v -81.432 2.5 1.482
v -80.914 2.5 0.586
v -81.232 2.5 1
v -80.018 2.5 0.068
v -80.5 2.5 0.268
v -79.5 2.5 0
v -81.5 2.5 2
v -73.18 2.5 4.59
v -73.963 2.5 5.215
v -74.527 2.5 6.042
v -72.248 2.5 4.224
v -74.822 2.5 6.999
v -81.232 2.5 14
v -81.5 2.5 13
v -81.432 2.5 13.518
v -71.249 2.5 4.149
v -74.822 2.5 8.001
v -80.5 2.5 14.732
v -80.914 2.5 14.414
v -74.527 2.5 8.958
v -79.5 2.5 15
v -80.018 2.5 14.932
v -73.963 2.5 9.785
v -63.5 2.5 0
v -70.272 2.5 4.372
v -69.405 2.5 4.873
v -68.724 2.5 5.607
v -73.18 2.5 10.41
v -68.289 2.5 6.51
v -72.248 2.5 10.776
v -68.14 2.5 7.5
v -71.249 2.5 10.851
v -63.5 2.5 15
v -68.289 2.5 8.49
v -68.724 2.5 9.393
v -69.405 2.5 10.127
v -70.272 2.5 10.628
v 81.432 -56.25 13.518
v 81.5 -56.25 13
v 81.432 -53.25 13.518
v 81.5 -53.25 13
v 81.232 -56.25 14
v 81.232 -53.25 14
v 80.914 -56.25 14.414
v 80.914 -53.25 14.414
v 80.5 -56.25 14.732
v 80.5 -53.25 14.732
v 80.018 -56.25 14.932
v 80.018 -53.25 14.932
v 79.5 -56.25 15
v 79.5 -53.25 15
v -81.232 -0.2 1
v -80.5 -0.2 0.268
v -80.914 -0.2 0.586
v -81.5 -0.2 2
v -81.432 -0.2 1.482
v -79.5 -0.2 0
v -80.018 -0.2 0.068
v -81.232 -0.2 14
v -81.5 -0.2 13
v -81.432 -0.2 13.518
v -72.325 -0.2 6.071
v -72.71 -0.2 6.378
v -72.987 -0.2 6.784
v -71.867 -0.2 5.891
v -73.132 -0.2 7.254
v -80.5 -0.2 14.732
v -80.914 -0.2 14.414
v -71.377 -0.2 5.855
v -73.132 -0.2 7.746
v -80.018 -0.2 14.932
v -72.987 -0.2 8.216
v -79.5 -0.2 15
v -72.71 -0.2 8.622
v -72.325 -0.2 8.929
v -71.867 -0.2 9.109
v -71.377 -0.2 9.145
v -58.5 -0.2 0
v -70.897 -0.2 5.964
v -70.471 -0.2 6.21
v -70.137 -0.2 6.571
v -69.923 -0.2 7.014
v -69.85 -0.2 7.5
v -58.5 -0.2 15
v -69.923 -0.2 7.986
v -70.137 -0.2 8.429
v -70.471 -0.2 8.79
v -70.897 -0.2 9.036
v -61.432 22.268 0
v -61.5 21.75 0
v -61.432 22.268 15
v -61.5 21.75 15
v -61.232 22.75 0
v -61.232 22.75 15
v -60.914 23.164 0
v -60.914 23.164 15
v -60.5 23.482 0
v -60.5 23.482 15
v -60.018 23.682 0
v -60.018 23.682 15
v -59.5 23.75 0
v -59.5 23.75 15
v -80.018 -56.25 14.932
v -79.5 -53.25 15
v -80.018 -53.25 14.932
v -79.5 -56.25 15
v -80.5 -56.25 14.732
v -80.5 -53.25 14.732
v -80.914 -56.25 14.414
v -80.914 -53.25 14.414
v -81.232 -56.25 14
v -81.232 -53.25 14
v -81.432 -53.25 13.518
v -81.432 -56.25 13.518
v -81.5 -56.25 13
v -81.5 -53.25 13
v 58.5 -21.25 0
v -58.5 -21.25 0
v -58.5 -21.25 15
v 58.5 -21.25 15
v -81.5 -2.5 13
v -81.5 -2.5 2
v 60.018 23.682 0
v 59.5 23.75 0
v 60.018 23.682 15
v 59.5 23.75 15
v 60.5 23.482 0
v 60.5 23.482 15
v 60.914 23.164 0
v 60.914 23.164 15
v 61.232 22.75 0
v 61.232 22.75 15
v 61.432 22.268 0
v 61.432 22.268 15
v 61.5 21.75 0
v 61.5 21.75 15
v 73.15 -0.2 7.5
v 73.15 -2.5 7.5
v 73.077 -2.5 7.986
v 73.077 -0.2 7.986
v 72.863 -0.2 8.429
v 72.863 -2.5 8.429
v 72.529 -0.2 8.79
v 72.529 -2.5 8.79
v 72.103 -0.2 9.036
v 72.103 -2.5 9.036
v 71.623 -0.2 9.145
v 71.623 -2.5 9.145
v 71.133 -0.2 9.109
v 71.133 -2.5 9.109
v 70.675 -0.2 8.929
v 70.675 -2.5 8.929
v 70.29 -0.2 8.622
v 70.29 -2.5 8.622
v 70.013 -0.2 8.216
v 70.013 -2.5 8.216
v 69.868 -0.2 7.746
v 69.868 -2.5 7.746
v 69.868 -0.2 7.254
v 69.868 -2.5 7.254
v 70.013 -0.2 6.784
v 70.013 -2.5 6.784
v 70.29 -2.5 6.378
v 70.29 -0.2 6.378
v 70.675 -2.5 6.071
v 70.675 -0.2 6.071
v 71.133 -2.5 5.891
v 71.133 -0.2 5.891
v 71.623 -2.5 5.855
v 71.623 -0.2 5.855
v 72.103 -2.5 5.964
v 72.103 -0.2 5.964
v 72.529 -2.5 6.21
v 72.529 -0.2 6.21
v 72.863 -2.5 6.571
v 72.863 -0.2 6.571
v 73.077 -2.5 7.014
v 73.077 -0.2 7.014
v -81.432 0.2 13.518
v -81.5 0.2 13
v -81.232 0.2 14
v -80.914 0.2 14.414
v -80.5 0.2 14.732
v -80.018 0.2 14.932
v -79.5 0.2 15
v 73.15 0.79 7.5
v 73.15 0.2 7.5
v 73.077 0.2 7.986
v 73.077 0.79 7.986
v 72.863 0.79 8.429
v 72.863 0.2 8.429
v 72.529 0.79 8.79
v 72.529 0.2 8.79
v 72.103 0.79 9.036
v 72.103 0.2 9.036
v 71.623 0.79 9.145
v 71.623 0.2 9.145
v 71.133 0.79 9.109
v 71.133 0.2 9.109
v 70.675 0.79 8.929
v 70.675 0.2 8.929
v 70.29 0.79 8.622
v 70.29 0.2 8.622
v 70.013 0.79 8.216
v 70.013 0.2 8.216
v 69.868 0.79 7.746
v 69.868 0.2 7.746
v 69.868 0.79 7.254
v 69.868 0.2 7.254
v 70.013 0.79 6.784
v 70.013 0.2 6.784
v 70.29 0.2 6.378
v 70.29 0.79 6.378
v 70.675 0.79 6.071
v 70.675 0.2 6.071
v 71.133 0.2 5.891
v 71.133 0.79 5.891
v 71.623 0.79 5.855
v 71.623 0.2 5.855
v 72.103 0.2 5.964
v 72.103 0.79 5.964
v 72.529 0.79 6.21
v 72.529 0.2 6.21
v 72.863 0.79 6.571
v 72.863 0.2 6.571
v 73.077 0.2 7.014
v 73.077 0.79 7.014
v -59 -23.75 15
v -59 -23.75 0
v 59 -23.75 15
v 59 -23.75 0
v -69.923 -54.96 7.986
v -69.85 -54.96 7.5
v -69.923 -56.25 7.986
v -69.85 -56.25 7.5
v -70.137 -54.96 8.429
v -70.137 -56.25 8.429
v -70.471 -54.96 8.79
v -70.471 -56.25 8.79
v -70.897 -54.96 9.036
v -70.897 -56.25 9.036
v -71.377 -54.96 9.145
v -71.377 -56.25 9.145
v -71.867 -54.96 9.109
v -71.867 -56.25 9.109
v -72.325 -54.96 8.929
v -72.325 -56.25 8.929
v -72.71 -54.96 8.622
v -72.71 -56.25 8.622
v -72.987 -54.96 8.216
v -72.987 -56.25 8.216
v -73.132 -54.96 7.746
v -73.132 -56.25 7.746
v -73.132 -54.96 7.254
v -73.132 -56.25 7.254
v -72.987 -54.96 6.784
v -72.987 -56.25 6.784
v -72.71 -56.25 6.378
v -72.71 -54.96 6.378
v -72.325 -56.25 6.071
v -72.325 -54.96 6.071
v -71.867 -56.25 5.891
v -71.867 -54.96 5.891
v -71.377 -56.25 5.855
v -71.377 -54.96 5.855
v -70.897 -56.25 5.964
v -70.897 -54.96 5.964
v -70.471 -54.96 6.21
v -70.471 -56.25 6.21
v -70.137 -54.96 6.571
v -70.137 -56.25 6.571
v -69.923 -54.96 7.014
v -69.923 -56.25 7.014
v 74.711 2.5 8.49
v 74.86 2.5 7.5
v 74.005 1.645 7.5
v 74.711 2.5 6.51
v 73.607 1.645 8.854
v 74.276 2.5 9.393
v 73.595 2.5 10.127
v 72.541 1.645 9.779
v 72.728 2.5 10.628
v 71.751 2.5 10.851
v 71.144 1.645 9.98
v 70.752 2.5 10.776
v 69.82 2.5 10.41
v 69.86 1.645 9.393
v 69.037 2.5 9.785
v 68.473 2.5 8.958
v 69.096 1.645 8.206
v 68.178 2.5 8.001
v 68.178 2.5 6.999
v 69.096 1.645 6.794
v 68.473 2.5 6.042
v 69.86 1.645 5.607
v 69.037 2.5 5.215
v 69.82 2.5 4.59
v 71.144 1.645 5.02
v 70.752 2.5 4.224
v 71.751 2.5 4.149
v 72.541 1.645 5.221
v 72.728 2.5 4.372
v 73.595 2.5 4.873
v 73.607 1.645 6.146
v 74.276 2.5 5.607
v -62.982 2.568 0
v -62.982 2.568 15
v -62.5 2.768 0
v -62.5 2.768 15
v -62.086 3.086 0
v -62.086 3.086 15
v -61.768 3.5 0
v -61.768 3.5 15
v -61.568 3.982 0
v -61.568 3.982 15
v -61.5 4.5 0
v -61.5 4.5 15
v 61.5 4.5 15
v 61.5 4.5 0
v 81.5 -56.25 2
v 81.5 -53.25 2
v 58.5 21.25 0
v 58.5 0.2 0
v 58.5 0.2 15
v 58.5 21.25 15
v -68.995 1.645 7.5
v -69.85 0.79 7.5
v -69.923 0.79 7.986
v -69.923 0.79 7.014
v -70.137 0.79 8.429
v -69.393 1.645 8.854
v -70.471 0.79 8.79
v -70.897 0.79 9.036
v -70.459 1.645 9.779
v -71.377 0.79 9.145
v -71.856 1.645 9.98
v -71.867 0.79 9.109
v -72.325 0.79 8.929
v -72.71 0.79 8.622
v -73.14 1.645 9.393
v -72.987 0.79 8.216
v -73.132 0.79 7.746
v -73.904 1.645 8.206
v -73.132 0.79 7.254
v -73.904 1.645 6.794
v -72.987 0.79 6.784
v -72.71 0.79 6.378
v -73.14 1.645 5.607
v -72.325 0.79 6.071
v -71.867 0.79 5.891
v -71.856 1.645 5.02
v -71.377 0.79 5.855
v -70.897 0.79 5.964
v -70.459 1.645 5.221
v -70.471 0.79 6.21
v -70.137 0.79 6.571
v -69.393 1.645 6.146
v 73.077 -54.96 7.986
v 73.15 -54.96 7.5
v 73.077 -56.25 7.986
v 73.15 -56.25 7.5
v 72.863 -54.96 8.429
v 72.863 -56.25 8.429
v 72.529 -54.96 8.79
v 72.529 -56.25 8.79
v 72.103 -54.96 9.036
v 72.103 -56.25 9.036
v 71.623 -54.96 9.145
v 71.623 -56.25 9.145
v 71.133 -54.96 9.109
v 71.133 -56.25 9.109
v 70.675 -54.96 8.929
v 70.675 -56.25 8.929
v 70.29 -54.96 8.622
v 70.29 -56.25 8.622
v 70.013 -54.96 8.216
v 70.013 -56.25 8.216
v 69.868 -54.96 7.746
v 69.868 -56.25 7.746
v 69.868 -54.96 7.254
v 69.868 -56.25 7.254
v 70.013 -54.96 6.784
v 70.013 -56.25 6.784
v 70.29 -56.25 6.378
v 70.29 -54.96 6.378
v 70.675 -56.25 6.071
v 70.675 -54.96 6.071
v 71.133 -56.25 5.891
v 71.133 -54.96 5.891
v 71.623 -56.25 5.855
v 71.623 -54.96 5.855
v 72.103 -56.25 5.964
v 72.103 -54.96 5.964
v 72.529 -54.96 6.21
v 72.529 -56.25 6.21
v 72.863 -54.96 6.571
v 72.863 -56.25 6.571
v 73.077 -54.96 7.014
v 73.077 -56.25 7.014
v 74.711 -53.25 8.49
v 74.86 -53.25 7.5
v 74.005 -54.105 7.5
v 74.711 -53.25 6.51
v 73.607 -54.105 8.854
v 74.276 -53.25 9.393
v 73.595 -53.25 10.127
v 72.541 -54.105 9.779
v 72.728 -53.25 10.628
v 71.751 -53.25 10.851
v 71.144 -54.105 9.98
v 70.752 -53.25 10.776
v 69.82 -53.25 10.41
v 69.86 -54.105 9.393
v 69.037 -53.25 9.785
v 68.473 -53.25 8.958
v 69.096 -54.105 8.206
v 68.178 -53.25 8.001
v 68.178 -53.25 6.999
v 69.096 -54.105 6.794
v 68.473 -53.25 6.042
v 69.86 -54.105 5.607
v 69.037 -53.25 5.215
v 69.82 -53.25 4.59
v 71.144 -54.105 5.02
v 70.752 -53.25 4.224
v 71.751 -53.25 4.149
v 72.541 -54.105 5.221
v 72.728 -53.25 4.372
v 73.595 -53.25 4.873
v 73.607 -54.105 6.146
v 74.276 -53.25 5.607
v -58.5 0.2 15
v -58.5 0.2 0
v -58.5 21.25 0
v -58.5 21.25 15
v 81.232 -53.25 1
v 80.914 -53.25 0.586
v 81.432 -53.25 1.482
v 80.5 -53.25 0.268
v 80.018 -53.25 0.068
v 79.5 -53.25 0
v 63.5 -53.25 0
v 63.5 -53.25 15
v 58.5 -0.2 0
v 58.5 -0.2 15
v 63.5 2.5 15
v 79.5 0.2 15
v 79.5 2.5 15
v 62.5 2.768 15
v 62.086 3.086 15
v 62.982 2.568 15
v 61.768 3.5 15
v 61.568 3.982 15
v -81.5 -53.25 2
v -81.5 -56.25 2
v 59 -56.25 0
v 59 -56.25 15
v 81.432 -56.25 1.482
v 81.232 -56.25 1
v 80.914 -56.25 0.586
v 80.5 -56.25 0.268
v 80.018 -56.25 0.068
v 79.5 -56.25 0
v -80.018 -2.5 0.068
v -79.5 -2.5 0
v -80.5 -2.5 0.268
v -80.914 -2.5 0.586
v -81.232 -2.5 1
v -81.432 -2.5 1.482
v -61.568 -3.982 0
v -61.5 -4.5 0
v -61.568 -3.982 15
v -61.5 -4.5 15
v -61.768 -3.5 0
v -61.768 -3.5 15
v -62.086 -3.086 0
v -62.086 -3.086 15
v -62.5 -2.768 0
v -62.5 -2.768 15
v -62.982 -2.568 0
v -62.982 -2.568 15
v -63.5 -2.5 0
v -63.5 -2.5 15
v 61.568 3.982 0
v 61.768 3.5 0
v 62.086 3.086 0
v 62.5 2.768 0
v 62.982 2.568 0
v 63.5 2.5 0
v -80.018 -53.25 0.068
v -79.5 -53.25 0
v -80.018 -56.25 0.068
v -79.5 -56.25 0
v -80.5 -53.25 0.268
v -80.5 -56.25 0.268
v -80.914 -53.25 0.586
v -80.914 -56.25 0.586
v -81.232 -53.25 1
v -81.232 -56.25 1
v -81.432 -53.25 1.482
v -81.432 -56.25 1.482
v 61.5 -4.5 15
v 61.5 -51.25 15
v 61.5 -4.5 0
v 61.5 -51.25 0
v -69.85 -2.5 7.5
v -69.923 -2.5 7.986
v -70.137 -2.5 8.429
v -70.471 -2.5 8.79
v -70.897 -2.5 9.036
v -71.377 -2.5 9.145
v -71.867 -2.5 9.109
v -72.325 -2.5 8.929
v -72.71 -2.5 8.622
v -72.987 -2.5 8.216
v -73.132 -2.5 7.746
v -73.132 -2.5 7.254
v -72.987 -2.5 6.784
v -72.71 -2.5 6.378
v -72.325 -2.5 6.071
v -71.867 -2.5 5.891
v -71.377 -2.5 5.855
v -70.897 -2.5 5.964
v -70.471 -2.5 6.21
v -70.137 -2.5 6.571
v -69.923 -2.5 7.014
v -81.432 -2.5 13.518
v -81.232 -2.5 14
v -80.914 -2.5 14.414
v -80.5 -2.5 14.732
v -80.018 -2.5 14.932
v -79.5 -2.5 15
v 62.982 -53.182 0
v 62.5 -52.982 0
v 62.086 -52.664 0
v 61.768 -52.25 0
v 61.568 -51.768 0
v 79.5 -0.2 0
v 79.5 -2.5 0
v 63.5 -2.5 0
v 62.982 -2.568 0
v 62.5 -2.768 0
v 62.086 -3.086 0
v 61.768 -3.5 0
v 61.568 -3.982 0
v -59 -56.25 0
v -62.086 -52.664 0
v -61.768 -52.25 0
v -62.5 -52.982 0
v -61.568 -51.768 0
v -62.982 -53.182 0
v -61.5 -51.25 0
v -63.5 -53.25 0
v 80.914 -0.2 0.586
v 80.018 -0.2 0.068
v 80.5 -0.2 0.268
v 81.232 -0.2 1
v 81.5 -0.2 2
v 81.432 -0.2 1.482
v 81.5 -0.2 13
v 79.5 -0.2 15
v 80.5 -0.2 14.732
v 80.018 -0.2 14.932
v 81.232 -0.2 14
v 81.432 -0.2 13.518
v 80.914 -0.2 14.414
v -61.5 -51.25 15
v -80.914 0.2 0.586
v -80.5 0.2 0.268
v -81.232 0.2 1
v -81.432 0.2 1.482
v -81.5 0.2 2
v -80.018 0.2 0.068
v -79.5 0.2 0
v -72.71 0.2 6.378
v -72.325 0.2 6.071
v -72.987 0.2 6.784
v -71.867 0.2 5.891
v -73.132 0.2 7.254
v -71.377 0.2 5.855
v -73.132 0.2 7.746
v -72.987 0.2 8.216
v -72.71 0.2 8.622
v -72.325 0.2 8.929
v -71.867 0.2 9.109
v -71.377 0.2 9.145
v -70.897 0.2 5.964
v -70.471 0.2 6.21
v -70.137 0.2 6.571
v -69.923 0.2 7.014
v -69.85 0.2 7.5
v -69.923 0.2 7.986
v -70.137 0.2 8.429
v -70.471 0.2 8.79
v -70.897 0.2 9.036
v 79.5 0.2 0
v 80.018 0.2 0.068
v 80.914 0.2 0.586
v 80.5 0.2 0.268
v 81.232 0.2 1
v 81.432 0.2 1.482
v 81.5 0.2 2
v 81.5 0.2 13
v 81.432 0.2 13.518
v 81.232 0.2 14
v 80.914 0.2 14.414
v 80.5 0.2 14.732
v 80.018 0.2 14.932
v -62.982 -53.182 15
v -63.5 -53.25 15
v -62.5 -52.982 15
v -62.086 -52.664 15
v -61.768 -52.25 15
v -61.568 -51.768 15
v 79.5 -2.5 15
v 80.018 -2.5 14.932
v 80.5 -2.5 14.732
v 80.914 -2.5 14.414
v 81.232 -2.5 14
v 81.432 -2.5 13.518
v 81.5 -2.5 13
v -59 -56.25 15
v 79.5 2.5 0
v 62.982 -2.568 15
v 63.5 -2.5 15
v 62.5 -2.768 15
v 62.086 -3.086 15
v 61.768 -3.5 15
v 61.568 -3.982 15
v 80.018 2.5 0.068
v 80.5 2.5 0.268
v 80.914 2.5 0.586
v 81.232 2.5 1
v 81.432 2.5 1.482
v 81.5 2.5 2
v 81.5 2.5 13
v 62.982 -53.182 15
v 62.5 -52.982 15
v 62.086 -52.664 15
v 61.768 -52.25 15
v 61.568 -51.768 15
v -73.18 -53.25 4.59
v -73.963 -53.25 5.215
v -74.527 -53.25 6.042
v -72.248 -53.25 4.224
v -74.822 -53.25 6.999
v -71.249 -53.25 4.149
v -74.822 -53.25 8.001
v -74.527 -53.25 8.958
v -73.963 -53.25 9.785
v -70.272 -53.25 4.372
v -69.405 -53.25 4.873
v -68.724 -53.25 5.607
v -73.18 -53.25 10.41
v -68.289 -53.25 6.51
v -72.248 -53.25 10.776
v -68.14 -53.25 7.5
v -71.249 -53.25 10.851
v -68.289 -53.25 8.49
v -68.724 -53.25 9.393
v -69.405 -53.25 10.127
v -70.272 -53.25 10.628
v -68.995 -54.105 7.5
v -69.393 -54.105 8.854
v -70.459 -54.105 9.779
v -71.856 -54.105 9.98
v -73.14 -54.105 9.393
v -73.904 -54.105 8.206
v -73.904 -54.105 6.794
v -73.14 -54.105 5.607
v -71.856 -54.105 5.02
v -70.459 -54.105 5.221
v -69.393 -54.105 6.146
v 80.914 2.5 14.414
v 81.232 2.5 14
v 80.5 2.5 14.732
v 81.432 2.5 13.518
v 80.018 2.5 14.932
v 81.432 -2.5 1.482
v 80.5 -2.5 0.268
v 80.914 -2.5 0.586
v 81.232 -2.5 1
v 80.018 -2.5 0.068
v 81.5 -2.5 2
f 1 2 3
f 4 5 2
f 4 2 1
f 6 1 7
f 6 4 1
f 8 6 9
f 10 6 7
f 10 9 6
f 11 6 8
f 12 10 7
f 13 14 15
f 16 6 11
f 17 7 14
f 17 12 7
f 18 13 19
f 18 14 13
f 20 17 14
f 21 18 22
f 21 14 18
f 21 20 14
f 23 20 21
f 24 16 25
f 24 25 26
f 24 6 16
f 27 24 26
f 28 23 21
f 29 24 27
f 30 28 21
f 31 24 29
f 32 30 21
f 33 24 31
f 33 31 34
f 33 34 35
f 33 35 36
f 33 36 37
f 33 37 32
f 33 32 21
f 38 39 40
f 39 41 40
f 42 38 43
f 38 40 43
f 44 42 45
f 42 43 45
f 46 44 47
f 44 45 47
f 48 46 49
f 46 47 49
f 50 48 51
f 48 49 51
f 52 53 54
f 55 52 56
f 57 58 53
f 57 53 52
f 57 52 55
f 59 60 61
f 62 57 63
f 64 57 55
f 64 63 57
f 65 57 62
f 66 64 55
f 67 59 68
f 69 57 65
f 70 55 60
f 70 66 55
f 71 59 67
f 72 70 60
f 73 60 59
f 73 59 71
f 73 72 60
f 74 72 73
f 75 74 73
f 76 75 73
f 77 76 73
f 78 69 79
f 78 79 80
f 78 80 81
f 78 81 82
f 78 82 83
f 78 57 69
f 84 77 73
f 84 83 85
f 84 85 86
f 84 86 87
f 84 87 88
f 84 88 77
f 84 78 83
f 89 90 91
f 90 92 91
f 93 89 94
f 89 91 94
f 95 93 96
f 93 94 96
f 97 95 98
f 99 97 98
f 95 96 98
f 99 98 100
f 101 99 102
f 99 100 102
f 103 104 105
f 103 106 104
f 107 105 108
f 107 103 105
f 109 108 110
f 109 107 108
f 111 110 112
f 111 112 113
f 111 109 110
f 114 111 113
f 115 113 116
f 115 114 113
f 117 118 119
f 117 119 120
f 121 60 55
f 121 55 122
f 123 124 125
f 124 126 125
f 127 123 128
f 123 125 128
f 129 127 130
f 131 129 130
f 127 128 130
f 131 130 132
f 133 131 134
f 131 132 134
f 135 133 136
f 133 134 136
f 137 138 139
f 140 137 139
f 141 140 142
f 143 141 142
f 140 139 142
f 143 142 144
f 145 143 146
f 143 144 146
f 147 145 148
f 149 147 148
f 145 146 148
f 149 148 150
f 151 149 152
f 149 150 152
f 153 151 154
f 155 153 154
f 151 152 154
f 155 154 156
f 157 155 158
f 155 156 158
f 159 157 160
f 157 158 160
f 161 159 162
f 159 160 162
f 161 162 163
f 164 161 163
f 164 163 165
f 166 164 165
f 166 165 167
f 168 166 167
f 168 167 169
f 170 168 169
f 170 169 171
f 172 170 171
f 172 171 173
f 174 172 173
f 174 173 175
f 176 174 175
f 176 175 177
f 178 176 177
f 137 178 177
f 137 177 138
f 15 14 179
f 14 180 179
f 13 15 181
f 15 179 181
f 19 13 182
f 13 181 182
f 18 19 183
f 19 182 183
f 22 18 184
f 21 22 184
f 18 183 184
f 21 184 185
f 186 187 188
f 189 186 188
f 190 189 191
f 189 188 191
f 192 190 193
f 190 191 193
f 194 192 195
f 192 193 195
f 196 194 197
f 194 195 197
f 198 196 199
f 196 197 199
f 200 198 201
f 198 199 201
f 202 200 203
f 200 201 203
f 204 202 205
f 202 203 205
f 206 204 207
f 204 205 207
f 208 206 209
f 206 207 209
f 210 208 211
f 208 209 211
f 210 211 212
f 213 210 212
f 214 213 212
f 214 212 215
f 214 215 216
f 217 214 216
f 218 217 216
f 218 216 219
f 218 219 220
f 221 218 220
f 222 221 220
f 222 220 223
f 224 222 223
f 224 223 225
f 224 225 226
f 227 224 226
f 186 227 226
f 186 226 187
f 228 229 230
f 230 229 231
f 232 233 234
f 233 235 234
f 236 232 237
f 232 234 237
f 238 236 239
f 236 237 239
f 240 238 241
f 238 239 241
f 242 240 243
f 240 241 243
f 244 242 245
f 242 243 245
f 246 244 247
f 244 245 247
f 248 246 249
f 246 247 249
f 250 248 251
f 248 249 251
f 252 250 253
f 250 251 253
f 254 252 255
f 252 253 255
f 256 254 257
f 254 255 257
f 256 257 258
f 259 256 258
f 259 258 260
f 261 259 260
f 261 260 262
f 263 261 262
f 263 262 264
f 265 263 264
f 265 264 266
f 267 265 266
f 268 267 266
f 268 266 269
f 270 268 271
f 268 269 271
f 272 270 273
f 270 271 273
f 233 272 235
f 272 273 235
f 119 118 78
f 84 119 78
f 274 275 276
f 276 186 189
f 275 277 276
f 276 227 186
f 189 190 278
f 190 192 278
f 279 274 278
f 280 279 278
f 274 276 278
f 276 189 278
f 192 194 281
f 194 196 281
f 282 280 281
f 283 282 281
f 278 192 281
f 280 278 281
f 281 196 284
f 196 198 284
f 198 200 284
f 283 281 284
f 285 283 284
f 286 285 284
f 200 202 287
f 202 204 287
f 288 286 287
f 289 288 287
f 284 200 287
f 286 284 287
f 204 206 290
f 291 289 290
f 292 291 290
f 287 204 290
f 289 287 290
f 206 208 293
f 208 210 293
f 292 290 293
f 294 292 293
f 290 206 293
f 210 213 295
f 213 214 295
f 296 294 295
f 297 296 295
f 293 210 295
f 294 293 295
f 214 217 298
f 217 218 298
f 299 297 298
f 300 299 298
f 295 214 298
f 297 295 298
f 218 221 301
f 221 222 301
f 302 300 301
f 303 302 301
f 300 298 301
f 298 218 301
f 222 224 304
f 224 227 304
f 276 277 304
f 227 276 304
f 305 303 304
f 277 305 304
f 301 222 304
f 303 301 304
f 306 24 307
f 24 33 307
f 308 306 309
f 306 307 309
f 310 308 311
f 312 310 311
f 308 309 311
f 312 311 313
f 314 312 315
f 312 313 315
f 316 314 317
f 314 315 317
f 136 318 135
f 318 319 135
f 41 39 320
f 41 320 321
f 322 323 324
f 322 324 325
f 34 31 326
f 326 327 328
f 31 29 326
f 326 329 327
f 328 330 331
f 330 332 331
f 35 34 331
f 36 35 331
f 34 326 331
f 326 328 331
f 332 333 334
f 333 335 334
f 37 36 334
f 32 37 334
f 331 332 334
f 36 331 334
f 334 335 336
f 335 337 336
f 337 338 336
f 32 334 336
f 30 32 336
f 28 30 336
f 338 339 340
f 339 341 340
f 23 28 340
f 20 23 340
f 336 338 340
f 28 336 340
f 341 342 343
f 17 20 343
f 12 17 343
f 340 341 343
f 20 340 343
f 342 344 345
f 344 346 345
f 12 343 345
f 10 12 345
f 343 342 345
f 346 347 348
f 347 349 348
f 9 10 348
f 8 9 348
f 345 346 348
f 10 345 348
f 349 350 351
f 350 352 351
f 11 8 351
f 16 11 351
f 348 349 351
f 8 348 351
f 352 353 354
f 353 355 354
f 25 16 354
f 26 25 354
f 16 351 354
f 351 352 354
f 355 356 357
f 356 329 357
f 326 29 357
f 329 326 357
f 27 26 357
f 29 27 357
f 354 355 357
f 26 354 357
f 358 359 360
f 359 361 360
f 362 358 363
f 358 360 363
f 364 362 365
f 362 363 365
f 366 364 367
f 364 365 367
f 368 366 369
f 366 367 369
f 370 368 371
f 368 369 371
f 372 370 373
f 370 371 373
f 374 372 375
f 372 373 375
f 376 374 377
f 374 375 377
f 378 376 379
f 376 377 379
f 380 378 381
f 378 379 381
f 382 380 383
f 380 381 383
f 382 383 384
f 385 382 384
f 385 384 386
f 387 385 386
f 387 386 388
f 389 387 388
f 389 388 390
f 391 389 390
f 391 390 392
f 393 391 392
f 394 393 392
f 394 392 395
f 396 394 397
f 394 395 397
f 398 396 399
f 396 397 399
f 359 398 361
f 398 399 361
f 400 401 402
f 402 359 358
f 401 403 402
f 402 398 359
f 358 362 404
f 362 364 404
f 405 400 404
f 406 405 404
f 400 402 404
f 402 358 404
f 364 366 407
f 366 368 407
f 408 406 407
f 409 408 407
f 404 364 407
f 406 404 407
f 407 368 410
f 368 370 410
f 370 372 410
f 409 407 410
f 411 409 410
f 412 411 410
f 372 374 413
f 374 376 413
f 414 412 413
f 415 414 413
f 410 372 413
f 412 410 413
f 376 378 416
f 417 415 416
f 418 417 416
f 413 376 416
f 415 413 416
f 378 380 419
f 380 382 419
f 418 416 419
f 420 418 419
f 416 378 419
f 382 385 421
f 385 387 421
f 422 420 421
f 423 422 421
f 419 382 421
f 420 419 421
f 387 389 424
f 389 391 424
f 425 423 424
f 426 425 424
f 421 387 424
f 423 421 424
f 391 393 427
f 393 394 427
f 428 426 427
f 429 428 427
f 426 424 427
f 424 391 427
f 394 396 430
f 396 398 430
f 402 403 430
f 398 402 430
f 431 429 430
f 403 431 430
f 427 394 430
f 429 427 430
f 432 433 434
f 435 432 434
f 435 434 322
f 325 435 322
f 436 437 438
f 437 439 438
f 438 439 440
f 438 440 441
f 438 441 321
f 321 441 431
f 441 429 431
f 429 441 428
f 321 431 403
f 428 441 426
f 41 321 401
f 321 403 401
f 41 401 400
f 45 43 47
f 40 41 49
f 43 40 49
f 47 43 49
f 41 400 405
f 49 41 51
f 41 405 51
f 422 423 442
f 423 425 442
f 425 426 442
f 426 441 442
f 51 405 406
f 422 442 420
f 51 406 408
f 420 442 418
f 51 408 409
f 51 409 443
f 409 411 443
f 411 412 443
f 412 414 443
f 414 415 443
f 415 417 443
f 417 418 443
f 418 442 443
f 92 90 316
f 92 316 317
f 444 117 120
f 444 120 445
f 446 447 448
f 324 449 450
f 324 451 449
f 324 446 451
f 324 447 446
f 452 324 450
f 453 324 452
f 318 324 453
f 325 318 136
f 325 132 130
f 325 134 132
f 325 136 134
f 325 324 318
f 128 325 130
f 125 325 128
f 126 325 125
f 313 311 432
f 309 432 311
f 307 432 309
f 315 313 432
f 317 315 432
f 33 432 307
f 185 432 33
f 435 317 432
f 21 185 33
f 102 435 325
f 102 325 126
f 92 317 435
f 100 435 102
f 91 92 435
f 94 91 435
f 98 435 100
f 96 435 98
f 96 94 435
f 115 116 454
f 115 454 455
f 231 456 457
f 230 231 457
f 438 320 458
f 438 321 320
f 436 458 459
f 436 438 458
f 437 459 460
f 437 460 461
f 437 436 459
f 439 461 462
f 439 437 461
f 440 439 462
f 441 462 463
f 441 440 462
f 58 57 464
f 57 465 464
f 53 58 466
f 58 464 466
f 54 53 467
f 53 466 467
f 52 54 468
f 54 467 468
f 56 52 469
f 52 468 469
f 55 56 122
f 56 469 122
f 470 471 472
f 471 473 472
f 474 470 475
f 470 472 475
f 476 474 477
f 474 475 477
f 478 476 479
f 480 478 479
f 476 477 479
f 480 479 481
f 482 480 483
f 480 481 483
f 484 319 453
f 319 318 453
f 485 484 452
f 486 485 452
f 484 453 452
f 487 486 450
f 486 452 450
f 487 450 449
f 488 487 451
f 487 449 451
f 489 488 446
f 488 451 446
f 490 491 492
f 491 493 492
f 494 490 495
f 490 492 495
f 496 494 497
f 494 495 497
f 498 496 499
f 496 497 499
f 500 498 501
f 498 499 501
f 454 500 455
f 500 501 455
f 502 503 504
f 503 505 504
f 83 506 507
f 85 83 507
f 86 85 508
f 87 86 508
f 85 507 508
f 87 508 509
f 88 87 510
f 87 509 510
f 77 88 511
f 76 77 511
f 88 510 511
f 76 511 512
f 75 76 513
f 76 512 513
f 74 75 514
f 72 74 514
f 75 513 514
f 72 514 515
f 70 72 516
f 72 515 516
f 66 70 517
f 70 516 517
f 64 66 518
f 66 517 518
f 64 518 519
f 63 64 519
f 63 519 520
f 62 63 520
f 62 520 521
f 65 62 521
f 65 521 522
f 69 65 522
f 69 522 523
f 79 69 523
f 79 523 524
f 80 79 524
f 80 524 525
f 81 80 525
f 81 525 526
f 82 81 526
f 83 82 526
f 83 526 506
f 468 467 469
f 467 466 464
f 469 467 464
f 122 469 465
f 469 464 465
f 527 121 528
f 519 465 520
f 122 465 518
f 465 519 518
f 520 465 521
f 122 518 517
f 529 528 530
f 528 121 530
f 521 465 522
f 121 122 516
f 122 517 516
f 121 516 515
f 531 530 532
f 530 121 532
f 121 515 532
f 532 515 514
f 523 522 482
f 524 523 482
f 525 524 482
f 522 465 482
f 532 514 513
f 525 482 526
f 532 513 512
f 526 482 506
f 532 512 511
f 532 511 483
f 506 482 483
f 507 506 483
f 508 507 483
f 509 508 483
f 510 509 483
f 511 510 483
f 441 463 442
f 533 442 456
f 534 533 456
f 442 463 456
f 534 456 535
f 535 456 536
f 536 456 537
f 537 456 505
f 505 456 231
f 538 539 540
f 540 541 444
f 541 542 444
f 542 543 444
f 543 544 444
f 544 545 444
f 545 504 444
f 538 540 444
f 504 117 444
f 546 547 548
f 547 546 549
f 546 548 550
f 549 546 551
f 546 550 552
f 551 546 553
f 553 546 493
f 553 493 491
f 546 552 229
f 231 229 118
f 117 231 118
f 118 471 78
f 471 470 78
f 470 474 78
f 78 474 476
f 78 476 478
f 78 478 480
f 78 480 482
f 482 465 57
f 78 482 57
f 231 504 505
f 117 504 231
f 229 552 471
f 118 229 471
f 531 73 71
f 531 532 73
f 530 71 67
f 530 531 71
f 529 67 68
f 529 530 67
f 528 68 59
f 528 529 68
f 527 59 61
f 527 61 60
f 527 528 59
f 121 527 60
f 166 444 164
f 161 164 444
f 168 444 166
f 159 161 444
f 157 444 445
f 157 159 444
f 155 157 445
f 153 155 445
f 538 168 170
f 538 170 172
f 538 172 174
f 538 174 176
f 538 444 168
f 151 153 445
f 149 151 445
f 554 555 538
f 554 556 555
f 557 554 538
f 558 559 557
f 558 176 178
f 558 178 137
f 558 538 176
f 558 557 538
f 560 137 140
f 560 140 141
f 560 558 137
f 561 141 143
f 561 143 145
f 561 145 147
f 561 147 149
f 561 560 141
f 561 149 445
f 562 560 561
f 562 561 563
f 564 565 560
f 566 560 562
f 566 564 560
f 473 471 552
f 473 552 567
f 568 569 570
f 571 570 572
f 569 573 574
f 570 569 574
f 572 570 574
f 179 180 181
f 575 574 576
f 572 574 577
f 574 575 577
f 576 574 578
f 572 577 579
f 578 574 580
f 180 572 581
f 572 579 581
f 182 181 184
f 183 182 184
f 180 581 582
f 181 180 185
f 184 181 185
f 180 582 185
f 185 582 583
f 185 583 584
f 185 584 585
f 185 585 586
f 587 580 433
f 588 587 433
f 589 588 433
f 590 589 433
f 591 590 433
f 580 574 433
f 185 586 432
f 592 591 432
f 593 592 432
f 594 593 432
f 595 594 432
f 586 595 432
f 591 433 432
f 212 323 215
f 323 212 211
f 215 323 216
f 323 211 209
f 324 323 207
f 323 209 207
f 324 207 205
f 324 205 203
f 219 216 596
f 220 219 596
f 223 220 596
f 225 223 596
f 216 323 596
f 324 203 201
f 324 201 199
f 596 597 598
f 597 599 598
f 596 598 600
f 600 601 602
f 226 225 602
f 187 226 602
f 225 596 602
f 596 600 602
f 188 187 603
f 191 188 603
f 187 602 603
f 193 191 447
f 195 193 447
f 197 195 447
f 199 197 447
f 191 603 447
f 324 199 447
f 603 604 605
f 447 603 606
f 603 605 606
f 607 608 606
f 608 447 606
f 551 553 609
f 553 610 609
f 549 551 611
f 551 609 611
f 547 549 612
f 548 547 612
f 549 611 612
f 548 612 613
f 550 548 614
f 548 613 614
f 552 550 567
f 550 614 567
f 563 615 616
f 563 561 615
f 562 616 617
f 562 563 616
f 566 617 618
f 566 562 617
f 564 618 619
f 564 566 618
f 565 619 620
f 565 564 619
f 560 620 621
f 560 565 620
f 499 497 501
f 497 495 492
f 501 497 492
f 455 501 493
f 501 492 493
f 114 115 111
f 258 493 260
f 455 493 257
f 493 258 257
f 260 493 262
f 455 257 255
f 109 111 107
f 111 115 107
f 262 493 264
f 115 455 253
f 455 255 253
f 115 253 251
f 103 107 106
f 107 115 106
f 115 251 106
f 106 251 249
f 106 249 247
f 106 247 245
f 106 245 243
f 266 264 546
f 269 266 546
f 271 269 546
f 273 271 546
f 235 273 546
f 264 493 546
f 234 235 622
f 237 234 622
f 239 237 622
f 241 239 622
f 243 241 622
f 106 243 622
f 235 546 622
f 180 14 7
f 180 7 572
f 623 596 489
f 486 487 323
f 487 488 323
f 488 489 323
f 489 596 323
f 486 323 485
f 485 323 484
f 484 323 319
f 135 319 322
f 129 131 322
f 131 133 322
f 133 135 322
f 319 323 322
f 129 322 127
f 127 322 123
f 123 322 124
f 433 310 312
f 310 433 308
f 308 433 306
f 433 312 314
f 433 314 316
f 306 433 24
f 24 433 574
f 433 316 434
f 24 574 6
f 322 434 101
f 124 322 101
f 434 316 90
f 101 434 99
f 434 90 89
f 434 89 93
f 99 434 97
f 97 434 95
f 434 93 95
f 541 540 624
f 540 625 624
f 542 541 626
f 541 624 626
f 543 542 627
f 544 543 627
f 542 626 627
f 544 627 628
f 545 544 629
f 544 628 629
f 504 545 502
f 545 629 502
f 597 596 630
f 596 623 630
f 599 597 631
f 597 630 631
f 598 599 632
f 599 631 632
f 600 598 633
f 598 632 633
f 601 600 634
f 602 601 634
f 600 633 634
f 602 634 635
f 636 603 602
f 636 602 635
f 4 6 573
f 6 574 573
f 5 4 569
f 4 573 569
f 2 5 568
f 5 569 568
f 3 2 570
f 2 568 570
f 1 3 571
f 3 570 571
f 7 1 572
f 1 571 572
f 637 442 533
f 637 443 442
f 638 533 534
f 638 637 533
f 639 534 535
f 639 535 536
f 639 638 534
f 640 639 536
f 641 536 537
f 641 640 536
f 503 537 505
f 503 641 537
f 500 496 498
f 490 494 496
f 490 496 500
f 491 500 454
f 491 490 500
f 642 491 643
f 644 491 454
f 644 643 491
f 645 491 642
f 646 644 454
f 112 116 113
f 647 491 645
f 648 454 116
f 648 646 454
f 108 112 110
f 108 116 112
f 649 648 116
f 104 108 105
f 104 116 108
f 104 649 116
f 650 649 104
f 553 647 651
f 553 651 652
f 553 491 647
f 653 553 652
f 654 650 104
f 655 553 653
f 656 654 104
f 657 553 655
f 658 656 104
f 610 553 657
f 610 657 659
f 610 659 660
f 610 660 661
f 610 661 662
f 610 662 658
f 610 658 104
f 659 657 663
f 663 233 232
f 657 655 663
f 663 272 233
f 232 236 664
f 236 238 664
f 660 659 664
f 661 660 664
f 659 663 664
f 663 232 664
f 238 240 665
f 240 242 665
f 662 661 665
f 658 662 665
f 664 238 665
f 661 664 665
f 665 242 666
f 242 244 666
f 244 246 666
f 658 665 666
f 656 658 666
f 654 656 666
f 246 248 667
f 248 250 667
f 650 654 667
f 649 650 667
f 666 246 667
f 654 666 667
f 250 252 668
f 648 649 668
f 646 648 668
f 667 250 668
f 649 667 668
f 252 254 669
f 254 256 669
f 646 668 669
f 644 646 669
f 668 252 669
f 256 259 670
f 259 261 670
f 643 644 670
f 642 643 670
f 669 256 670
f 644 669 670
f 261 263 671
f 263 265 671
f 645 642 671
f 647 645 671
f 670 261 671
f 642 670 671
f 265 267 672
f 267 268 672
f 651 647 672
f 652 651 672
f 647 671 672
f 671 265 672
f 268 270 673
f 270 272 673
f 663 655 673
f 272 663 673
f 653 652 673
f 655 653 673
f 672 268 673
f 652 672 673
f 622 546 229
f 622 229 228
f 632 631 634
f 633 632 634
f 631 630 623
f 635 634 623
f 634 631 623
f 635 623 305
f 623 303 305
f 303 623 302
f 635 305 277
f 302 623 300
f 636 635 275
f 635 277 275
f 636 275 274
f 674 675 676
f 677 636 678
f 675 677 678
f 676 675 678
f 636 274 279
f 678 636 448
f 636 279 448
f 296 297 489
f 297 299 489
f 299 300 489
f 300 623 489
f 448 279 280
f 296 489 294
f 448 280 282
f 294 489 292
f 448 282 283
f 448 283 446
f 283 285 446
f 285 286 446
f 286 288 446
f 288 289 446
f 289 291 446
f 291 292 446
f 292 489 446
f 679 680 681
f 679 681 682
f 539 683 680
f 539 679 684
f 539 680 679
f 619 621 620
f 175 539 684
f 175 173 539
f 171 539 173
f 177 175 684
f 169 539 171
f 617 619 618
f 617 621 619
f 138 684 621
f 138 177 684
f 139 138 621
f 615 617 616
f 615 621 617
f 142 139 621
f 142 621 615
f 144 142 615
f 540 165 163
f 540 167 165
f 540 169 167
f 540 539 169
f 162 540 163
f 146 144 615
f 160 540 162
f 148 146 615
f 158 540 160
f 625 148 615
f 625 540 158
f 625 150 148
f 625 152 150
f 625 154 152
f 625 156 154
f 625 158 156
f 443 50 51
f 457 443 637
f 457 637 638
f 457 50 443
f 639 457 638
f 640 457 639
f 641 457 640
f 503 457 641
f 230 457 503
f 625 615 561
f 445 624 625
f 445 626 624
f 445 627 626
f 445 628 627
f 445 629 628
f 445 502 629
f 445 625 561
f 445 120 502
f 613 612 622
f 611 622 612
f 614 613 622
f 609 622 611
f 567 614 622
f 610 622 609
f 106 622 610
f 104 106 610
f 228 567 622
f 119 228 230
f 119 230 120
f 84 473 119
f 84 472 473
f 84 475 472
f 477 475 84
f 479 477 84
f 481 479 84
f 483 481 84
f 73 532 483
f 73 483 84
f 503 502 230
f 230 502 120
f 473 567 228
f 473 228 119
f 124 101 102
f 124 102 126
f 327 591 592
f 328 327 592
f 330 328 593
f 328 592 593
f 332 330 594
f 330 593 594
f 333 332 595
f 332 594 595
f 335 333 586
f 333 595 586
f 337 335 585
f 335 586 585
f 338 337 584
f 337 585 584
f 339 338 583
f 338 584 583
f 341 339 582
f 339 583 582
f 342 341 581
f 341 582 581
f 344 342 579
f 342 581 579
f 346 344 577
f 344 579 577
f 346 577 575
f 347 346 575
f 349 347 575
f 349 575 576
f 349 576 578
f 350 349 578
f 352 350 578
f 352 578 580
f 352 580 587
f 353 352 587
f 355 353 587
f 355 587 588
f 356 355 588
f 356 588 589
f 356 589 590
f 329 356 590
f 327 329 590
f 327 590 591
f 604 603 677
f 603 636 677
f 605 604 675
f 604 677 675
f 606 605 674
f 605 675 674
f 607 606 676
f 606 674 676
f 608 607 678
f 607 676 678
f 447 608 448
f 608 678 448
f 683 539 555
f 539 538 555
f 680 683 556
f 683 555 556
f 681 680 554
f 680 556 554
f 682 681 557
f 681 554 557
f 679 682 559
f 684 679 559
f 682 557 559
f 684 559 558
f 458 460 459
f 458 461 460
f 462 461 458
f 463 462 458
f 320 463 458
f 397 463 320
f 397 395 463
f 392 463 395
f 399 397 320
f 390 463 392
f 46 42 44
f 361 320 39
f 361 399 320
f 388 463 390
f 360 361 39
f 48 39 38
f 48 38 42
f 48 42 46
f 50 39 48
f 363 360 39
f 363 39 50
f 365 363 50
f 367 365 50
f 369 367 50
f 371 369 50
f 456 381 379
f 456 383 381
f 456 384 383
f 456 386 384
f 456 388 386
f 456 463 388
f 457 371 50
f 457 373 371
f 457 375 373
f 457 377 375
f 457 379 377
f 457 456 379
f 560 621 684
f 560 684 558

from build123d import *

# Parameters (mm, degrees)
F0_W            = 123
F0_H            = 47.5
F0_W_2          = 117
F0_H_2          = 42.5
F1_DEPTH        = 15
F3_W            = 2.5
F3_H            = 15
F4_DEPTH        = 32.5
F5_W            = 3
F5_H            = 15
F6_DEPTH        = 20
F7_W            = 3
F7_H            = 15
F8_DEPTH        = 20
F10_D           = 3.3
F10_DEPTH       = 5
F10_CSINK_D     = 6.72
F10_CSINK_ANGLE = 90
F10_TIP         = 0.9914200214
F12_D           = 3.3
F12_DEPTH       = 5
F12_CSINK_D     = 6.72
F12_CSINK_ANGLE = 90
F12_TIP         = 0.9914200214
F13_W           = 5
F13_H           = 15
F14_DEPTH       = 20
F16_D           = 3.3
F16_CSINK_D     = 6.72
F16_CSINK_ANGLE = 90
F17_W           = 5
F17_H           = 15
F18_DEPTH       = 20
F20_D           = 3.3
F20_CSINK_D     = 6.72
F20_CSINK_ANGLE = 90
F21_W           = 0.4
F21_H           = 15
F22_DEPTH       = 200
F23_R           = 2


with BuildPart() as f1:
    # F0 (on Top) → F1 (new body)
    with BuildSketch(Plane.XY):
        Rectangle(F0_W, F0_H)
        Rectangle(F0_W_2, F0_H_2, mode=Mode.SUBTRACT)
    extrude(amount=F1_DEPTH)

    # F3 (on face) → F4 (join)
    with BuildSketch(Plane.XZ.offset(23.75)):
        with Locations((-60.25, 7.5)):
            Rectangle(F3_W, F3_H)
        with Locations((60.25, 7.5)):
            Rectangle(F3_W, F3_H)
    extrude(amount=F4_DEPTH)

    # F5 (on face) → F6 (join)
    with BuildSketch(Plane(origin=(-61.5, 0, 0), x_dir=(0, -1, 0), z_dir=(-1, 0, 0))):
        with Locations((54.75, 7.5)):
            Rectangle(F5_W, F5_H)
    extrude(amount=F6_DEPTH)

    # F7 (on face) → F8 (join)
    with BuildSketch(Plane.YZ.offset(61.5)):
        with Locations((-54.75, 7.5)):
            Rectangle(F7_W, F7_H)
    extrude(amount=F8_DEPTH)

    # F10
    with Locations(Plane(origin=(0, -53.25, 0), x_dir=(-1, 0, 0), z_dir=(0, 1, 0))):
        with Locations((-71.5, 7.5)):
            CounterSinkHole(F10_D / 2, F10_CSINK_D / 2, depth=F10_DEPTH, counter_sink_angle=F10_CSINK_ANGLE)
            with Locations((0, 0, -(F10_DEPTH + F10_TIP / 2))):  # 118° drill point
                Cone(0, F10_D / 2, F10_TIP, mode=Mode.SUBTRACT)

    # F12
    with Locations(Plane(origin=(0, -53.25, 0), x_dir=(-1, 0, 0), z_dir=(0, 1, 0))):
        with Locations((71.5, 7.5)):
            CounterSinkHole(F12_D / 2, F12_CSINK_D / 2, depth=F12_DEPTH, counter_sink_angle=F12_CSINK_ANGLE)
            with Locations((0, 0, -(F12_DEPTH + F12_TIP / 2))):  # 118° drill point
                Cone(0, F12_D / 2, F12_TIP, mode=Mode.SUBTRACT)

    # F13 (on face) → F14 (join)
    with BuildSketch(Plane(origin=(-61.5, 0, 0), x_dir=(0, -1, 0), z_dir=(-1, 0, 0))):
        with Locations((0, 7.5)):
            Rectangle(F13_W, F13_H)
    extrude(amount=F14_DEPTH)

    # F16 (through all)
    with Locations(Plane(origin=(0, 2.5, 0), x_dir=(-1, 0, 0), z_dir=(0, 1, 0))):
        with Locations((71.5, 7.5)):
            CounterSinkHole(F16_D / 2, F16_CSINK_D / 2, counter_sink_angle=F16_CSINK_ANGLE)

    # F17 (on face) → F18 (join)
    with BuildSketch(Plane.YZ.offset(61.5)):
        with Locations((0, 7.5)):
            Rectangle(F17_W, F17_H)
    extrude(amount=F18_DEPTH)

    # F20 (through all)
    with Locations(Plane(origin=(0, 2.5, 0), x_dir=(-1, 0, 0), z_dir=(0, 1, 0))):
        with Locations((-71.5, 7.5)):
            CounterSinkHole(F20_D / 2, F20_CSINK_D / 2, counter_sink_angle=F20_CSINK_ANGLE)

    # F21 (on face) → F22 (cut)
    with BuildSketch(Plane.YZ.offset(81.5)):
        with Locations((0, 7.5)):
            Rectangle(F21_W, F21_H)
    extrude(amount=-F22_DEPTH, mode=Mode.SUBTRACT)

    # F23
    f23_edges = [f1.edges().sort_by_distance(p)[0] for p in [
        (-61.5, 23.75, 7.5),
        (-81.5, -1.35, 0),
        (-81.5, 1.35, 0),
        (-81.5, -54.75, 15),
        (81.5, -54.75, 0),
        (81.5, -1.35, 15),
        (81.5, 1.35, 15),
        (61.5, 23.75, 7.5),
        (-61.5, -53.25, 7.5),
        (61.5, -53.25, 7.5),
        (81.5, -1.35, 0),
        (81.5, 1.35, 0),
        (-81.5, -1.35, 15),
        (-81.5, 1.35, 15),
        (-61.5, 2.5, 7.5),
        (-61.5, -2.5, 7.5),
        (61.5, 2.5, 7.5),
        (61.5, -2.5, 7.5),
        (-81.5, -54.75, 0),
        (81.5, -54.75, 15),
    ]]
    fillet(f23_edges, radius=F23_R)


solid = f1.part
